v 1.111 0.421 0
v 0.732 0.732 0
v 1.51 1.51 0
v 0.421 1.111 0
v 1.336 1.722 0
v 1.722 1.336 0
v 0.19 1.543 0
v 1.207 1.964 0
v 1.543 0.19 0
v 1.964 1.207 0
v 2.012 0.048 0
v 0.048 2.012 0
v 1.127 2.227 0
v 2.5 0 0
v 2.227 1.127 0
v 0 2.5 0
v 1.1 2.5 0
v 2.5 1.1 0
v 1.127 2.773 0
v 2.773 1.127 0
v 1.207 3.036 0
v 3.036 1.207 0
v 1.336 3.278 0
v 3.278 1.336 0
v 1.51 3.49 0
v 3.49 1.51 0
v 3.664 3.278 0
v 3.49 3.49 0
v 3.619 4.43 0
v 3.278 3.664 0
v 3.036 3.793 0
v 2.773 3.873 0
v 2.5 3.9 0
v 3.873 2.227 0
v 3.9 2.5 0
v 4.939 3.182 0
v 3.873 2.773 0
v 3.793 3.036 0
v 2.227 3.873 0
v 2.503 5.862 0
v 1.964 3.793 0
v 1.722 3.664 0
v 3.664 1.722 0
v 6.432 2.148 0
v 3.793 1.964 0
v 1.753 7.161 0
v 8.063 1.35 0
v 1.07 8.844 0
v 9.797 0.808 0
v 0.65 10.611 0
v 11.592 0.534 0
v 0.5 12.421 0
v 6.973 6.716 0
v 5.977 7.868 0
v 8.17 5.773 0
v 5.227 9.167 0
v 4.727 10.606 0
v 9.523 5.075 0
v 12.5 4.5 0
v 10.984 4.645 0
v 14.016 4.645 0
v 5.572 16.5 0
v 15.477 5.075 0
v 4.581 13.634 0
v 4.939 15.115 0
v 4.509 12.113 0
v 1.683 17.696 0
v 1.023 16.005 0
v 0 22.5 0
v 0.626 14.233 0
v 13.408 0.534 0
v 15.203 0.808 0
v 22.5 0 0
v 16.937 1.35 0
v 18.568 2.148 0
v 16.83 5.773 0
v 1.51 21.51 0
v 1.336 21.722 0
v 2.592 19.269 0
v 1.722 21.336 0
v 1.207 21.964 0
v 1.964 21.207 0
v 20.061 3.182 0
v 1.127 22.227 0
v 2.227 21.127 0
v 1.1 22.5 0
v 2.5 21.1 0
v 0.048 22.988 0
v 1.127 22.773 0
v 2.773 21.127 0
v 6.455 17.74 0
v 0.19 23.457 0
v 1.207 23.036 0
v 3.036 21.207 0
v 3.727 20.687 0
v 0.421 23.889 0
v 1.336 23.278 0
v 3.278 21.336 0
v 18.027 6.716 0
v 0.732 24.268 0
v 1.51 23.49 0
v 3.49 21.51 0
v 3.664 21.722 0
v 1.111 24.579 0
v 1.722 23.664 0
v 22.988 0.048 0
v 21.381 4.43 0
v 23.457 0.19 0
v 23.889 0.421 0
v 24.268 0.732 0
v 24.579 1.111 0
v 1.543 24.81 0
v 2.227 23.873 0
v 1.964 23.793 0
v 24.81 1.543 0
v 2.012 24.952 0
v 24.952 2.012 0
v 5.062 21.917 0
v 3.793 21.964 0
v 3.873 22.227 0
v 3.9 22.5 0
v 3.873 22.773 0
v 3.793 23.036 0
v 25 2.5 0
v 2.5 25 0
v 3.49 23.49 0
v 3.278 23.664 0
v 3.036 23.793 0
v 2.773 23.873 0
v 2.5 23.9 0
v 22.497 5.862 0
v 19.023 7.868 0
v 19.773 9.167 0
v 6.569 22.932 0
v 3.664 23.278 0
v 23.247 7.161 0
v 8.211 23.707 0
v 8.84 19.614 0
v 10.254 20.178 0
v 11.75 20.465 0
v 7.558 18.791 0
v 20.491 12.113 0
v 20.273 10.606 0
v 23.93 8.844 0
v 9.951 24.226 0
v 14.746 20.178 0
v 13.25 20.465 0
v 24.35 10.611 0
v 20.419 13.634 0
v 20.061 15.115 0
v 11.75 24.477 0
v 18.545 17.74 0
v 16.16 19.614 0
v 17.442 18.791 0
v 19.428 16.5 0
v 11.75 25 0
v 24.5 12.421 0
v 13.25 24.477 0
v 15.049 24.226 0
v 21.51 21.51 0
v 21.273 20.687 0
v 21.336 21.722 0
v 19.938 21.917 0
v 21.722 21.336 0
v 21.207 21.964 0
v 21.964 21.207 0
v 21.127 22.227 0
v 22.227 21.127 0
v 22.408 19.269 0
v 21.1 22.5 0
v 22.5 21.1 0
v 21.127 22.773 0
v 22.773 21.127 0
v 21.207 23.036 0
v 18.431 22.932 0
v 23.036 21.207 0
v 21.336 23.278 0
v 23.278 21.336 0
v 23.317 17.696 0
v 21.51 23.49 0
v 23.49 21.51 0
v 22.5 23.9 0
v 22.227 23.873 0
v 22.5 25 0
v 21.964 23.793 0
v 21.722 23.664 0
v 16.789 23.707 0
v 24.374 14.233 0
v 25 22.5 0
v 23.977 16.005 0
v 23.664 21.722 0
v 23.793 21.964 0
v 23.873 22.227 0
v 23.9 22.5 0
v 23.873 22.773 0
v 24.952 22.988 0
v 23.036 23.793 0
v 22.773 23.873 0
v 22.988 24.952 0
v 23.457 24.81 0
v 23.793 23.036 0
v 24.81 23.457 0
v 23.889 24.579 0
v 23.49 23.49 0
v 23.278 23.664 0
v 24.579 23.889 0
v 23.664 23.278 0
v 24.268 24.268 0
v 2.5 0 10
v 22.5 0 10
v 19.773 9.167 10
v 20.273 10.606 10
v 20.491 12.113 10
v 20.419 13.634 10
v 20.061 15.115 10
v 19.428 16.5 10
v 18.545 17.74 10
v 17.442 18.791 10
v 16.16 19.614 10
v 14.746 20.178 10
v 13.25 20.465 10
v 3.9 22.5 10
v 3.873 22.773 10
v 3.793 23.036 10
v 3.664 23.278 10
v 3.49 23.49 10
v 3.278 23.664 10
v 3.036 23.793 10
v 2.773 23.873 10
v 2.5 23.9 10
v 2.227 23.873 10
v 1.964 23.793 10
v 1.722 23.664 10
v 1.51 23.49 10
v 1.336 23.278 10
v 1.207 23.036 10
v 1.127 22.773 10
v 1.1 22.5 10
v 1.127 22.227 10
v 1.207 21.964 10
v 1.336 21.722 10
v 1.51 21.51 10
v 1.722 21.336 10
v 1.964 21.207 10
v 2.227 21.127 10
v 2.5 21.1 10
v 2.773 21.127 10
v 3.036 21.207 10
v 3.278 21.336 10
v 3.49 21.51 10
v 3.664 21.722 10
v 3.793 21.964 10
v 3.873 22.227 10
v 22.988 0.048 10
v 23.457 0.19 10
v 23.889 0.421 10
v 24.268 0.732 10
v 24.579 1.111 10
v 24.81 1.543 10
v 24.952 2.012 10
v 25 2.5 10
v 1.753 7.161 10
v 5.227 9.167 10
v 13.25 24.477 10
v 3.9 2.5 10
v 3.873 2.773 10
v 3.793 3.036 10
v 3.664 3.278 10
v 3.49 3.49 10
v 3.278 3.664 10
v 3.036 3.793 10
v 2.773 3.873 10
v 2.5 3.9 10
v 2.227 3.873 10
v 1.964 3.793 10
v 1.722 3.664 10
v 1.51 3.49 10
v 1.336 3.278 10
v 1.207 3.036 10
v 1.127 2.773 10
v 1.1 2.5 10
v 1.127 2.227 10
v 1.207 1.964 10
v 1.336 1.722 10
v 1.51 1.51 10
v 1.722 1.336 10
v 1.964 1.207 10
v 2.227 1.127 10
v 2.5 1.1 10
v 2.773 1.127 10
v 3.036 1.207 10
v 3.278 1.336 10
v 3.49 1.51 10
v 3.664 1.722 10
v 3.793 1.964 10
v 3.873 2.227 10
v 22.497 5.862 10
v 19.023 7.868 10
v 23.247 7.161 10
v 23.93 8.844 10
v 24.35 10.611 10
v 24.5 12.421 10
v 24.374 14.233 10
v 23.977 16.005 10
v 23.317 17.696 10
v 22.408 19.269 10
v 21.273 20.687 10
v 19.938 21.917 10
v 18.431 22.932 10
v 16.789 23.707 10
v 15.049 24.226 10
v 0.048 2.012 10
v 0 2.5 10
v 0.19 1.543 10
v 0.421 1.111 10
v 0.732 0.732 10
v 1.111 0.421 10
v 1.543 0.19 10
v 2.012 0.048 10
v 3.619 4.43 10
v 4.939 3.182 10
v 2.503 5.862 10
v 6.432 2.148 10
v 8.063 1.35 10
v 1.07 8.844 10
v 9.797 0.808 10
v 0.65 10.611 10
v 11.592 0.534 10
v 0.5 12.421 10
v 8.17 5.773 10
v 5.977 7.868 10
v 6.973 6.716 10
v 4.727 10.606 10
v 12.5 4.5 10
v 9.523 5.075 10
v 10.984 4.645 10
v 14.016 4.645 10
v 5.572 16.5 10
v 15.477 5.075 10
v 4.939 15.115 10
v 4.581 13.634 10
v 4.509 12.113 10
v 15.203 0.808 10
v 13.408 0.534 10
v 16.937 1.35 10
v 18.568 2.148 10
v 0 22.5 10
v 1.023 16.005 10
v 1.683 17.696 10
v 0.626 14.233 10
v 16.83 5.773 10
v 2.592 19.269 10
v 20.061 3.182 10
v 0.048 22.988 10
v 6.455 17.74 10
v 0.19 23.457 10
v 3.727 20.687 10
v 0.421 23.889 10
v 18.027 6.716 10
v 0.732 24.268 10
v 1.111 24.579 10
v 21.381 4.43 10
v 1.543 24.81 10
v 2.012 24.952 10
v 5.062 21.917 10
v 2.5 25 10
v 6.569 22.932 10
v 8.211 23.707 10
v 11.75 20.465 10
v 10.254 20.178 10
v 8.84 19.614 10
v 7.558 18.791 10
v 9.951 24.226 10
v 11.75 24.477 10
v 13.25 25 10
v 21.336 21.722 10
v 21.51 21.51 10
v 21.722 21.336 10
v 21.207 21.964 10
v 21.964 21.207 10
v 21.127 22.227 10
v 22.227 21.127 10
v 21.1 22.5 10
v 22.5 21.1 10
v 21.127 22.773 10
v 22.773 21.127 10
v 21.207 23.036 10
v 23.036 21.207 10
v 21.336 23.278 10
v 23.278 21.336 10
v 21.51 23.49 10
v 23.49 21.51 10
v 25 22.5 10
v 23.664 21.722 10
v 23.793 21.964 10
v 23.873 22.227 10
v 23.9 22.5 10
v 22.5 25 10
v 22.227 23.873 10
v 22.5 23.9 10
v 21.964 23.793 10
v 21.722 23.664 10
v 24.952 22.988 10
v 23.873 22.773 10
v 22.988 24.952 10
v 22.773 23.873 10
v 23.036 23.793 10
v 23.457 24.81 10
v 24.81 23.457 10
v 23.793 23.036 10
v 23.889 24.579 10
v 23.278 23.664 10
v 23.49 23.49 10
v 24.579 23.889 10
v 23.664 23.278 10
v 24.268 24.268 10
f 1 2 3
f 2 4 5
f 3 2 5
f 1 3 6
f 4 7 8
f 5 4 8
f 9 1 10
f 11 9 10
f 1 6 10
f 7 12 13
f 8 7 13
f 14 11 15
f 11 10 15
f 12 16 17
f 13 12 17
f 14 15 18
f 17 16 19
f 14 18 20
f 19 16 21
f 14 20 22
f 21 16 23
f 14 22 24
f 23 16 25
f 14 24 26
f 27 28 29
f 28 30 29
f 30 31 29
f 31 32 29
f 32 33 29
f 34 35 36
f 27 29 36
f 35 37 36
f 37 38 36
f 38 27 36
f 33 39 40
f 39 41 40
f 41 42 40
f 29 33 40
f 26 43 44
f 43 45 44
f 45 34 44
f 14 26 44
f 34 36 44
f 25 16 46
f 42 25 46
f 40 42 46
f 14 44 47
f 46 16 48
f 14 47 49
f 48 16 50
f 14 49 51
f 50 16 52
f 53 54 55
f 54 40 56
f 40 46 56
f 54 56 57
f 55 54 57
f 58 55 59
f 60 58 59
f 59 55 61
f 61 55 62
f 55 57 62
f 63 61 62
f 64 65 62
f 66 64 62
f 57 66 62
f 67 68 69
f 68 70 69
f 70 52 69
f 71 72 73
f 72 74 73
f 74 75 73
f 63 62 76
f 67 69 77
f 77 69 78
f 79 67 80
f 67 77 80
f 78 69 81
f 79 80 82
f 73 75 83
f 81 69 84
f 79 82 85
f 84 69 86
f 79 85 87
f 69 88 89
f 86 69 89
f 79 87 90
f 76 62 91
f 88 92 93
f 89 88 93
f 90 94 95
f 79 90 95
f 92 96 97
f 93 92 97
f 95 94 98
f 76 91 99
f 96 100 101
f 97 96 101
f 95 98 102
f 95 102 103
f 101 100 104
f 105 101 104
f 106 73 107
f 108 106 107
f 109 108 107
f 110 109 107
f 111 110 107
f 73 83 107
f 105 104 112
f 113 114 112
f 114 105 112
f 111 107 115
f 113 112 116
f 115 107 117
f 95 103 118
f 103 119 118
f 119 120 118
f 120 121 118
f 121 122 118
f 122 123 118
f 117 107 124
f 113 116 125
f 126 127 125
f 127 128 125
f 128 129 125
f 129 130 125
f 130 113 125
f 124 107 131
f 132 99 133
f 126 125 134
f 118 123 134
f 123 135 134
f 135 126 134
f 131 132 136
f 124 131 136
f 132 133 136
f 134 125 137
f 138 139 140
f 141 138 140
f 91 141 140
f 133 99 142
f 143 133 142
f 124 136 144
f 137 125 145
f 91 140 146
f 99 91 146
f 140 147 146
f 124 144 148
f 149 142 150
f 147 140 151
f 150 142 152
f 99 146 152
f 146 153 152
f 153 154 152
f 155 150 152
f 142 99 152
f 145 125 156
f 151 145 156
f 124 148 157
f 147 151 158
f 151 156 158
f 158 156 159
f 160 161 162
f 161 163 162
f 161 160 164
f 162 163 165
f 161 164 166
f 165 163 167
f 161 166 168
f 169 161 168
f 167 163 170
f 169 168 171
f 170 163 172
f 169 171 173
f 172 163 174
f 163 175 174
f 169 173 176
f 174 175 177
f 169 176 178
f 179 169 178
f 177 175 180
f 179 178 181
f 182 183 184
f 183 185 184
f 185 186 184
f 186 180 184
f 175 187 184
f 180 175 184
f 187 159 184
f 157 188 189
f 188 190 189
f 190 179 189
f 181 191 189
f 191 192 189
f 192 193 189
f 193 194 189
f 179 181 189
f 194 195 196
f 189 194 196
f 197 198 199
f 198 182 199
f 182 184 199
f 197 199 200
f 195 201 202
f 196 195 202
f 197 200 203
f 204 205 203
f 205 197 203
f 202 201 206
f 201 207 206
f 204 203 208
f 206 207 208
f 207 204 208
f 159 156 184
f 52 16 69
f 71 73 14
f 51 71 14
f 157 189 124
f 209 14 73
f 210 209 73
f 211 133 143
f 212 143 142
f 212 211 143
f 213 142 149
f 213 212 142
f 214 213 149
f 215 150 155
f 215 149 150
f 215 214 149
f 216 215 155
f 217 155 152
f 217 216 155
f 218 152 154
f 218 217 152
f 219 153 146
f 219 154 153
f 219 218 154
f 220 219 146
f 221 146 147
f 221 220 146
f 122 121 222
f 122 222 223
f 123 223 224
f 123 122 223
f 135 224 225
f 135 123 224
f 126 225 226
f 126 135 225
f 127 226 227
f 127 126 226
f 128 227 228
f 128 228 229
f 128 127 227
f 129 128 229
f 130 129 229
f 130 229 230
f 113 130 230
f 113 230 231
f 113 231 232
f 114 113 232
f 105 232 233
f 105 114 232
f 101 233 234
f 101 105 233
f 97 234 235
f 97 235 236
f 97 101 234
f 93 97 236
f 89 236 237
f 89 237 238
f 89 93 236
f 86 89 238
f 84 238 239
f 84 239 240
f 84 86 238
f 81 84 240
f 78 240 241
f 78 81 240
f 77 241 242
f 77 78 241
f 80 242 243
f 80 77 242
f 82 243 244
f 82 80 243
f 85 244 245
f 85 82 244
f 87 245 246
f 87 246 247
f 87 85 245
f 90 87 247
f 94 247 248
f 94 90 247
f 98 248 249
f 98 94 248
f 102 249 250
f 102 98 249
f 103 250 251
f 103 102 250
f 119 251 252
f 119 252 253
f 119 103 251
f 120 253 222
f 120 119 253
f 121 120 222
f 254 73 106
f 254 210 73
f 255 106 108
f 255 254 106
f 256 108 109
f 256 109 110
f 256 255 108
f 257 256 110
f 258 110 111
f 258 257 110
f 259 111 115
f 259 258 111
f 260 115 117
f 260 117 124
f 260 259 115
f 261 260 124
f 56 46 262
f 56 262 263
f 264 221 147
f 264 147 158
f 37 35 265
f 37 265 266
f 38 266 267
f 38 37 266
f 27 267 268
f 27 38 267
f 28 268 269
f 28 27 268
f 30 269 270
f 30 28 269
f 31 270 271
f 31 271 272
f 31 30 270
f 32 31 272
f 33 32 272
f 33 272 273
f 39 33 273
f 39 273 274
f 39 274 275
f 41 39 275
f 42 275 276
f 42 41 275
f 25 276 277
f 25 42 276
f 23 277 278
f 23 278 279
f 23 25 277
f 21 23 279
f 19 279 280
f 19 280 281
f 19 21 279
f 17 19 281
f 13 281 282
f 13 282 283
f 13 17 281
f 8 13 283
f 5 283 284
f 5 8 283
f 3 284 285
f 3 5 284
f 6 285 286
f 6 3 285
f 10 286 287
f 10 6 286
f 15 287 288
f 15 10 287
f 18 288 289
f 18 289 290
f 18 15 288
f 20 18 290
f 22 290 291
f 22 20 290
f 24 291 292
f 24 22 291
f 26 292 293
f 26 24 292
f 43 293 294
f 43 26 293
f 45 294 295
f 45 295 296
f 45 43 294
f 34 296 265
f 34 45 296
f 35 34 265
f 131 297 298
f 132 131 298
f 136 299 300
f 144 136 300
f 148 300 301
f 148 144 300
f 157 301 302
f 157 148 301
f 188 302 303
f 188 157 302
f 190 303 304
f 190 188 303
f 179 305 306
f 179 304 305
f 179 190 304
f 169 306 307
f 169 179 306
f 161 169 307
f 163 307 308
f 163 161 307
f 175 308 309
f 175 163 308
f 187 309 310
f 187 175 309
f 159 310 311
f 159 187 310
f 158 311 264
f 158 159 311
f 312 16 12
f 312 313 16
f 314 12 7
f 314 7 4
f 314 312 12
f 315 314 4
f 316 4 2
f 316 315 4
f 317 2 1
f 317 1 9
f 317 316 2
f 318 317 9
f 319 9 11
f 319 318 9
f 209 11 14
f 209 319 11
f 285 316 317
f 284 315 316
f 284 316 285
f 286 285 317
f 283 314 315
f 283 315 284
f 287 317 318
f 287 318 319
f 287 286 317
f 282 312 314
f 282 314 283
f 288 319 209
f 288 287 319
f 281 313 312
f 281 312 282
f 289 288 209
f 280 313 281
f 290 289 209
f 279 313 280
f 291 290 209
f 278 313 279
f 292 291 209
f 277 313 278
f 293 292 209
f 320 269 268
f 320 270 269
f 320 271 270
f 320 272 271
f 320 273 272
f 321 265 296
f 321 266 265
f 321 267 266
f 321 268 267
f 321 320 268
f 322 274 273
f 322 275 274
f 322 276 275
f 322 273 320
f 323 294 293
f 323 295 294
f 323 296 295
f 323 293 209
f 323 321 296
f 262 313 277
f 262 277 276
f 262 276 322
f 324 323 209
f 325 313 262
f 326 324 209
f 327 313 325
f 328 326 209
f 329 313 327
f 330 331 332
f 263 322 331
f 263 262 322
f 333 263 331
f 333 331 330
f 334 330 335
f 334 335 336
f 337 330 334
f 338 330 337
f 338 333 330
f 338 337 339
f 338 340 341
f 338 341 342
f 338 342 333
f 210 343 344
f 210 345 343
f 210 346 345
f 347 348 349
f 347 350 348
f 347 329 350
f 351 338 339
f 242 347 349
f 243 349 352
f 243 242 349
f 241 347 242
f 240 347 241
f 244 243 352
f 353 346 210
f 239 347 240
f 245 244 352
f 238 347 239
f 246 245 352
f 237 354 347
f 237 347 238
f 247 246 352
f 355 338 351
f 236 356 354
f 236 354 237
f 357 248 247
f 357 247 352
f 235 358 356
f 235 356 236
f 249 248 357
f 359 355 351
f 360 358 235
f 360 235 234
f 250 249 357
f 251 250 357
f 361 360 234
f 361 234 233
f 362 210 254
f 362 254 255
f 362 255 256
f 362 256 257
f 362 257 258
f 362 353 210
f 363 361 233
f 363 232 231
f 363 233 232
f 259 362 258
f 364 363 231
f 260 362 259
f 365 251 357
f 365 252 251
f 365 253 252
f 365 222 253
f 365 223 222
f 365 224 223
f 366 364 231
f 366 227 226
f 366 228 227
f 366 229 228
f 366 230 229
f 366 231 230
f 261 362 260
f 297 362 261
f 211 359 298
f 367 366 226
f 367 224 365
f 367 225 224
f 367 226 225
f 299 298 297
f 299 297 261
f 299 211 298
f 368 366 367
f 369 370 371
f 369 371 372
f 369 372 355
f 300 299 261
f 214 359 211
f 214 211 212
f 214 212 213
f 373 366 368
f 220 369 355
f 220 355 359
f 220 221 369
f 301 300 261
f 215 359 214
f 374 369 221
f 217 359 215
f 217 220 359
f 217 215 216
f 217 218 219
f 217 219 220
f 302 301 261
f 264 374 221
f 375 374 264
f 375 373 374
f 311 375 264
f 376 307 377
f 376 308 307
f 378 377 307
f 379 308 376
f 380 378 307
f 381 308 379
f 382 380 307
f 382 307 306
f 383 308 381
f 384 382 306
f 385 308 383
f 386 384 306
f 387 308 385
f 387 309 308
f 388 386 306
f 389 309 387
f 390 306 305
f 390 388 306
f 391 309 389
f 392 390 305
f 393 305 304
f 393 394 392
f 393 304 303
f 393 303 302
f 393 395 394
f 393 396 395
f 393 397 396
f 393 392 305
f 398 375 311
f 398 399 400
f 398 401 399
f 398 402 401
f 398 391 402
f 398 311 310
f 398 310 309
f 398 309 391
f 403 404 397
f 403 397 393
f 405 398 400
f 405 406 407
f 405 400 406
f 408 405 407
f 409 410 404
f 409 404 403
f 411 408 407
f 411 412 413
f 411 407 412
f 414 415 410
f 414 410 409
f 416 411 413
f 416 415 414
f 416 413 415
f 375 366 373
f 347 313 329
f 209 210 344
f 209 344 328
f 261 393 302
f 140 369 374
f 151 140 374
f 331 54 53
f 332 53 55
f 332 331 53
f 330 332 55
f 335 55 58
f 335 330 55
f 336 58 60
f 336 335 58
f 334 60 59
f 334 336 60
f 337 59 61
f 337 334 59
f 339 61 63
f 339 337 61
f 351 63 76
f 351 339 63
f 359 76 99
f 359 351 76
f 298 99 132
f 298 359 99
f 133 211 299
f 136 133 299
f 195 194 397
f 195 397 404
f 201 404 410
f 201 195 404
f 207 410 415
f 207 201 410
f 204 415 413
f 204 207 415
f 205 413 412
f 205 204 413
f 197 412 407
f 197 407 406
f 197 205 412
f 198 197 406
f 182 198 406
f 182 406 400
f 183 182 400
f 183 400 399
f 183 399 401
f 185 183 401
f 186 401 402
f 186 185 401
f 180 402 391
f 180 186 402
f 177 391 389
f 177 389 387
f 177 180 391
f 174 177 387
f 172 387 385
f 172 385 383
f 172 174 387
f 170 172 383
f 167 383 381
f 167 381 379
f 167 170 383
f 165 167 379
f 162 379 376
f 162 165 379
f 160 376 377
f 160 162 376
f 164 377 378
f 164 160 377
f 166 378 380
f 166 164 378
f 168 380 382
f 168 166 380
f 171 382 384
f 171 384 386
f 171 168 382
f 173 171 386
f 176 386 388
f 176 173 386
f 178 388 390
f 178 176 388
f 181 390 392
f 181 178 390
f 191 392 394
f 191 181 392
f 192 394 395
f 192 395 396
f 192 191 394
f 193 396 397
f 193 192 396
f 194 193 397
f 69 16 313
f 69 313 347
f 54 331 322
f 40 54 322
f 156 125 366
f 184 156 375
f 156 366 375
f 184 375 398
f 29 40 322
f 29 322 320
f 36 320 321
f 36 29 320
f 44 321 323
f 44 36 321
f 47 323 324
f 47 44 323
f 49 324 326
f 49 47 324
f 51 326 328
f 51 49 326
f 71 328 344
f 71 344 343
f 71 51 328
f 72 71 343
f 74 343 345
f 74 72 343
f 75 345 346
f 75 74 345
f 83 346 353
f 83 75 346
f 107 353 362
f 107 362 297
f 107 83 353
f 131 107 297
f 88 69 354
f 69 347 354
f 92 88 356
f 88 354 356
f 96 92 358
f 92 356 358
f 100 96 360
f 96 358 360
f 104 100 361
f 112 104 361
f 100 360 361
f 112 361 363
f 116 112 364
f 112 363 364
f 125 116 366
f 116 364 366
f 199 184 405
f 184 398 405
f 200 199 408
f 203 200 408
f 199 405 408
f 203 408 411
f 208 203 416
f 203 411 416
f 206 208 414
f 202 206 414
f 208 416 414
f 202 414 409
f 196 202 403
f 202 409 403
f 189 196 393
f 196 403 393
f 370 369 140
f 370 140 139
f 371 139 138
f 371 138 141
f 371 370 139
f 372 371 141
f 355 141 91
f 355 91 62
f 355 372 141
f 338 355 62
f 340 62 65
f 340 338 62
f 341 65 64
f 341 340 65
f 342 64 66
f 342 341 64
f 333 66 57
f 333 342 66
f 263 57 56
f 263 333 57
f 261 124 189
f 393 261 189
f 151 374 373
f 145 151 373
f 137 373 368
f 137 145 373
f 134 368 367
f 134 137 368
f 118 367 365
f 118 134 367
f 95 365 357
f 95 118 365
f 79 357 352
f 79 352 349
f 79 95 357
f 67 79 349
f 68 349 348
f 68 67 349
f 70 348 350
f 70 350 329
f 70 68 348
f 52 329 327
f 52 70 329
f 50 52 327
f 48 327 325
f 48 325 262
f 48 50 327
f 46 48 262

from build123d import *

# Parameters (mm, degrees)
SKETCH1_W           = 25
SKETCH1_H           = 25
SKETCH1_R           = 12
SKETCH1_R_2         = 1.4
BOSS_EXTRUDE1_DEPTH = 10
FILLET1_R           = 2.5
SKETCH2_R           = 8
BOSS_EXTRUDE2_DEPTH = 10
SKETCH3_W           = 1.5
SKETCH3_H           = 4.535233839
BOSS_EXTRUDE3_DEPTH = 10


with BuildPart() as part:
    # Sketch1 → Boss-Extrude1 (new body)
    with BuildSketch(Plane.XY):
        with Locations((12.5, 12.5)):
            Rectangle(SKETCH1_W, SKETCH1_H)
        with Locations((12.5, 12.5)):
            Circle(SKETCH1_R, mode=Mode.SUBTRACT)
        with Locations((2.5, 22.5)):
            Circle(SKETCH1_R_2, mode=Mode.SUBTRACT)
        with Locations((2.5, 2.5)):
            Circle(SKETCH1_R_2, mode=Mode.SUBTRACT)
        with Locations((22.5, 22.5)):
            Circle(SKETCH1_R_2, mode=Mode.SUBTRACT)
    extrude(amount=BOSS_EXTRUDE1_DEPTH)

    # Fillet1
    fillet1_edges = [part.edges().sort_by_distance(p)[0] for p in [
        (0, 25, 5),
        (25, 25, 5),
        (25, 0, 5),
        (0, 0, 5),
    ]]
    fillet(fillet1_edges, radius=FILLET1_R)



with BuildPart() as body_2:
    # Sketch2 → Boss-Extrude2 (new body)
    with BuildSketch(Plane.XY.offset(10)):
        with Locations((12.5, 12.5)):
            Circle(SKETCH2_R)
    extrude(amount=-BOSS_EXTRUDE2_DEPTH)


with BuildPart() as part_1:
    add(part.part)

    add(body_2.part)  # Boss-Extrude3 merges body 2
    # Sketch3 → Boss-Extrude3 (add)
    with BuildSketch(Plane.XY.offset(10)):
        with Locations((12.5, 22.732383081)):
            Rectangle(SKETCH3_W, SKETCH3_H)
        Polygon((23.700317547, 6.899519053), (22.950317547, 5.600480947), (19.022689831, 7.868097867), (19.772689831, 9.167135972), align=None)
        Polygon((2.049682453, 5.600480947), (1.299682453, 6.899519053), (5.227310169, 9.167135972), (5.977310169, 7.868097867), align=None)
    extrude(amount=-BOSS_EXTRUDE3_DEPTH)


solid = part_1.part
